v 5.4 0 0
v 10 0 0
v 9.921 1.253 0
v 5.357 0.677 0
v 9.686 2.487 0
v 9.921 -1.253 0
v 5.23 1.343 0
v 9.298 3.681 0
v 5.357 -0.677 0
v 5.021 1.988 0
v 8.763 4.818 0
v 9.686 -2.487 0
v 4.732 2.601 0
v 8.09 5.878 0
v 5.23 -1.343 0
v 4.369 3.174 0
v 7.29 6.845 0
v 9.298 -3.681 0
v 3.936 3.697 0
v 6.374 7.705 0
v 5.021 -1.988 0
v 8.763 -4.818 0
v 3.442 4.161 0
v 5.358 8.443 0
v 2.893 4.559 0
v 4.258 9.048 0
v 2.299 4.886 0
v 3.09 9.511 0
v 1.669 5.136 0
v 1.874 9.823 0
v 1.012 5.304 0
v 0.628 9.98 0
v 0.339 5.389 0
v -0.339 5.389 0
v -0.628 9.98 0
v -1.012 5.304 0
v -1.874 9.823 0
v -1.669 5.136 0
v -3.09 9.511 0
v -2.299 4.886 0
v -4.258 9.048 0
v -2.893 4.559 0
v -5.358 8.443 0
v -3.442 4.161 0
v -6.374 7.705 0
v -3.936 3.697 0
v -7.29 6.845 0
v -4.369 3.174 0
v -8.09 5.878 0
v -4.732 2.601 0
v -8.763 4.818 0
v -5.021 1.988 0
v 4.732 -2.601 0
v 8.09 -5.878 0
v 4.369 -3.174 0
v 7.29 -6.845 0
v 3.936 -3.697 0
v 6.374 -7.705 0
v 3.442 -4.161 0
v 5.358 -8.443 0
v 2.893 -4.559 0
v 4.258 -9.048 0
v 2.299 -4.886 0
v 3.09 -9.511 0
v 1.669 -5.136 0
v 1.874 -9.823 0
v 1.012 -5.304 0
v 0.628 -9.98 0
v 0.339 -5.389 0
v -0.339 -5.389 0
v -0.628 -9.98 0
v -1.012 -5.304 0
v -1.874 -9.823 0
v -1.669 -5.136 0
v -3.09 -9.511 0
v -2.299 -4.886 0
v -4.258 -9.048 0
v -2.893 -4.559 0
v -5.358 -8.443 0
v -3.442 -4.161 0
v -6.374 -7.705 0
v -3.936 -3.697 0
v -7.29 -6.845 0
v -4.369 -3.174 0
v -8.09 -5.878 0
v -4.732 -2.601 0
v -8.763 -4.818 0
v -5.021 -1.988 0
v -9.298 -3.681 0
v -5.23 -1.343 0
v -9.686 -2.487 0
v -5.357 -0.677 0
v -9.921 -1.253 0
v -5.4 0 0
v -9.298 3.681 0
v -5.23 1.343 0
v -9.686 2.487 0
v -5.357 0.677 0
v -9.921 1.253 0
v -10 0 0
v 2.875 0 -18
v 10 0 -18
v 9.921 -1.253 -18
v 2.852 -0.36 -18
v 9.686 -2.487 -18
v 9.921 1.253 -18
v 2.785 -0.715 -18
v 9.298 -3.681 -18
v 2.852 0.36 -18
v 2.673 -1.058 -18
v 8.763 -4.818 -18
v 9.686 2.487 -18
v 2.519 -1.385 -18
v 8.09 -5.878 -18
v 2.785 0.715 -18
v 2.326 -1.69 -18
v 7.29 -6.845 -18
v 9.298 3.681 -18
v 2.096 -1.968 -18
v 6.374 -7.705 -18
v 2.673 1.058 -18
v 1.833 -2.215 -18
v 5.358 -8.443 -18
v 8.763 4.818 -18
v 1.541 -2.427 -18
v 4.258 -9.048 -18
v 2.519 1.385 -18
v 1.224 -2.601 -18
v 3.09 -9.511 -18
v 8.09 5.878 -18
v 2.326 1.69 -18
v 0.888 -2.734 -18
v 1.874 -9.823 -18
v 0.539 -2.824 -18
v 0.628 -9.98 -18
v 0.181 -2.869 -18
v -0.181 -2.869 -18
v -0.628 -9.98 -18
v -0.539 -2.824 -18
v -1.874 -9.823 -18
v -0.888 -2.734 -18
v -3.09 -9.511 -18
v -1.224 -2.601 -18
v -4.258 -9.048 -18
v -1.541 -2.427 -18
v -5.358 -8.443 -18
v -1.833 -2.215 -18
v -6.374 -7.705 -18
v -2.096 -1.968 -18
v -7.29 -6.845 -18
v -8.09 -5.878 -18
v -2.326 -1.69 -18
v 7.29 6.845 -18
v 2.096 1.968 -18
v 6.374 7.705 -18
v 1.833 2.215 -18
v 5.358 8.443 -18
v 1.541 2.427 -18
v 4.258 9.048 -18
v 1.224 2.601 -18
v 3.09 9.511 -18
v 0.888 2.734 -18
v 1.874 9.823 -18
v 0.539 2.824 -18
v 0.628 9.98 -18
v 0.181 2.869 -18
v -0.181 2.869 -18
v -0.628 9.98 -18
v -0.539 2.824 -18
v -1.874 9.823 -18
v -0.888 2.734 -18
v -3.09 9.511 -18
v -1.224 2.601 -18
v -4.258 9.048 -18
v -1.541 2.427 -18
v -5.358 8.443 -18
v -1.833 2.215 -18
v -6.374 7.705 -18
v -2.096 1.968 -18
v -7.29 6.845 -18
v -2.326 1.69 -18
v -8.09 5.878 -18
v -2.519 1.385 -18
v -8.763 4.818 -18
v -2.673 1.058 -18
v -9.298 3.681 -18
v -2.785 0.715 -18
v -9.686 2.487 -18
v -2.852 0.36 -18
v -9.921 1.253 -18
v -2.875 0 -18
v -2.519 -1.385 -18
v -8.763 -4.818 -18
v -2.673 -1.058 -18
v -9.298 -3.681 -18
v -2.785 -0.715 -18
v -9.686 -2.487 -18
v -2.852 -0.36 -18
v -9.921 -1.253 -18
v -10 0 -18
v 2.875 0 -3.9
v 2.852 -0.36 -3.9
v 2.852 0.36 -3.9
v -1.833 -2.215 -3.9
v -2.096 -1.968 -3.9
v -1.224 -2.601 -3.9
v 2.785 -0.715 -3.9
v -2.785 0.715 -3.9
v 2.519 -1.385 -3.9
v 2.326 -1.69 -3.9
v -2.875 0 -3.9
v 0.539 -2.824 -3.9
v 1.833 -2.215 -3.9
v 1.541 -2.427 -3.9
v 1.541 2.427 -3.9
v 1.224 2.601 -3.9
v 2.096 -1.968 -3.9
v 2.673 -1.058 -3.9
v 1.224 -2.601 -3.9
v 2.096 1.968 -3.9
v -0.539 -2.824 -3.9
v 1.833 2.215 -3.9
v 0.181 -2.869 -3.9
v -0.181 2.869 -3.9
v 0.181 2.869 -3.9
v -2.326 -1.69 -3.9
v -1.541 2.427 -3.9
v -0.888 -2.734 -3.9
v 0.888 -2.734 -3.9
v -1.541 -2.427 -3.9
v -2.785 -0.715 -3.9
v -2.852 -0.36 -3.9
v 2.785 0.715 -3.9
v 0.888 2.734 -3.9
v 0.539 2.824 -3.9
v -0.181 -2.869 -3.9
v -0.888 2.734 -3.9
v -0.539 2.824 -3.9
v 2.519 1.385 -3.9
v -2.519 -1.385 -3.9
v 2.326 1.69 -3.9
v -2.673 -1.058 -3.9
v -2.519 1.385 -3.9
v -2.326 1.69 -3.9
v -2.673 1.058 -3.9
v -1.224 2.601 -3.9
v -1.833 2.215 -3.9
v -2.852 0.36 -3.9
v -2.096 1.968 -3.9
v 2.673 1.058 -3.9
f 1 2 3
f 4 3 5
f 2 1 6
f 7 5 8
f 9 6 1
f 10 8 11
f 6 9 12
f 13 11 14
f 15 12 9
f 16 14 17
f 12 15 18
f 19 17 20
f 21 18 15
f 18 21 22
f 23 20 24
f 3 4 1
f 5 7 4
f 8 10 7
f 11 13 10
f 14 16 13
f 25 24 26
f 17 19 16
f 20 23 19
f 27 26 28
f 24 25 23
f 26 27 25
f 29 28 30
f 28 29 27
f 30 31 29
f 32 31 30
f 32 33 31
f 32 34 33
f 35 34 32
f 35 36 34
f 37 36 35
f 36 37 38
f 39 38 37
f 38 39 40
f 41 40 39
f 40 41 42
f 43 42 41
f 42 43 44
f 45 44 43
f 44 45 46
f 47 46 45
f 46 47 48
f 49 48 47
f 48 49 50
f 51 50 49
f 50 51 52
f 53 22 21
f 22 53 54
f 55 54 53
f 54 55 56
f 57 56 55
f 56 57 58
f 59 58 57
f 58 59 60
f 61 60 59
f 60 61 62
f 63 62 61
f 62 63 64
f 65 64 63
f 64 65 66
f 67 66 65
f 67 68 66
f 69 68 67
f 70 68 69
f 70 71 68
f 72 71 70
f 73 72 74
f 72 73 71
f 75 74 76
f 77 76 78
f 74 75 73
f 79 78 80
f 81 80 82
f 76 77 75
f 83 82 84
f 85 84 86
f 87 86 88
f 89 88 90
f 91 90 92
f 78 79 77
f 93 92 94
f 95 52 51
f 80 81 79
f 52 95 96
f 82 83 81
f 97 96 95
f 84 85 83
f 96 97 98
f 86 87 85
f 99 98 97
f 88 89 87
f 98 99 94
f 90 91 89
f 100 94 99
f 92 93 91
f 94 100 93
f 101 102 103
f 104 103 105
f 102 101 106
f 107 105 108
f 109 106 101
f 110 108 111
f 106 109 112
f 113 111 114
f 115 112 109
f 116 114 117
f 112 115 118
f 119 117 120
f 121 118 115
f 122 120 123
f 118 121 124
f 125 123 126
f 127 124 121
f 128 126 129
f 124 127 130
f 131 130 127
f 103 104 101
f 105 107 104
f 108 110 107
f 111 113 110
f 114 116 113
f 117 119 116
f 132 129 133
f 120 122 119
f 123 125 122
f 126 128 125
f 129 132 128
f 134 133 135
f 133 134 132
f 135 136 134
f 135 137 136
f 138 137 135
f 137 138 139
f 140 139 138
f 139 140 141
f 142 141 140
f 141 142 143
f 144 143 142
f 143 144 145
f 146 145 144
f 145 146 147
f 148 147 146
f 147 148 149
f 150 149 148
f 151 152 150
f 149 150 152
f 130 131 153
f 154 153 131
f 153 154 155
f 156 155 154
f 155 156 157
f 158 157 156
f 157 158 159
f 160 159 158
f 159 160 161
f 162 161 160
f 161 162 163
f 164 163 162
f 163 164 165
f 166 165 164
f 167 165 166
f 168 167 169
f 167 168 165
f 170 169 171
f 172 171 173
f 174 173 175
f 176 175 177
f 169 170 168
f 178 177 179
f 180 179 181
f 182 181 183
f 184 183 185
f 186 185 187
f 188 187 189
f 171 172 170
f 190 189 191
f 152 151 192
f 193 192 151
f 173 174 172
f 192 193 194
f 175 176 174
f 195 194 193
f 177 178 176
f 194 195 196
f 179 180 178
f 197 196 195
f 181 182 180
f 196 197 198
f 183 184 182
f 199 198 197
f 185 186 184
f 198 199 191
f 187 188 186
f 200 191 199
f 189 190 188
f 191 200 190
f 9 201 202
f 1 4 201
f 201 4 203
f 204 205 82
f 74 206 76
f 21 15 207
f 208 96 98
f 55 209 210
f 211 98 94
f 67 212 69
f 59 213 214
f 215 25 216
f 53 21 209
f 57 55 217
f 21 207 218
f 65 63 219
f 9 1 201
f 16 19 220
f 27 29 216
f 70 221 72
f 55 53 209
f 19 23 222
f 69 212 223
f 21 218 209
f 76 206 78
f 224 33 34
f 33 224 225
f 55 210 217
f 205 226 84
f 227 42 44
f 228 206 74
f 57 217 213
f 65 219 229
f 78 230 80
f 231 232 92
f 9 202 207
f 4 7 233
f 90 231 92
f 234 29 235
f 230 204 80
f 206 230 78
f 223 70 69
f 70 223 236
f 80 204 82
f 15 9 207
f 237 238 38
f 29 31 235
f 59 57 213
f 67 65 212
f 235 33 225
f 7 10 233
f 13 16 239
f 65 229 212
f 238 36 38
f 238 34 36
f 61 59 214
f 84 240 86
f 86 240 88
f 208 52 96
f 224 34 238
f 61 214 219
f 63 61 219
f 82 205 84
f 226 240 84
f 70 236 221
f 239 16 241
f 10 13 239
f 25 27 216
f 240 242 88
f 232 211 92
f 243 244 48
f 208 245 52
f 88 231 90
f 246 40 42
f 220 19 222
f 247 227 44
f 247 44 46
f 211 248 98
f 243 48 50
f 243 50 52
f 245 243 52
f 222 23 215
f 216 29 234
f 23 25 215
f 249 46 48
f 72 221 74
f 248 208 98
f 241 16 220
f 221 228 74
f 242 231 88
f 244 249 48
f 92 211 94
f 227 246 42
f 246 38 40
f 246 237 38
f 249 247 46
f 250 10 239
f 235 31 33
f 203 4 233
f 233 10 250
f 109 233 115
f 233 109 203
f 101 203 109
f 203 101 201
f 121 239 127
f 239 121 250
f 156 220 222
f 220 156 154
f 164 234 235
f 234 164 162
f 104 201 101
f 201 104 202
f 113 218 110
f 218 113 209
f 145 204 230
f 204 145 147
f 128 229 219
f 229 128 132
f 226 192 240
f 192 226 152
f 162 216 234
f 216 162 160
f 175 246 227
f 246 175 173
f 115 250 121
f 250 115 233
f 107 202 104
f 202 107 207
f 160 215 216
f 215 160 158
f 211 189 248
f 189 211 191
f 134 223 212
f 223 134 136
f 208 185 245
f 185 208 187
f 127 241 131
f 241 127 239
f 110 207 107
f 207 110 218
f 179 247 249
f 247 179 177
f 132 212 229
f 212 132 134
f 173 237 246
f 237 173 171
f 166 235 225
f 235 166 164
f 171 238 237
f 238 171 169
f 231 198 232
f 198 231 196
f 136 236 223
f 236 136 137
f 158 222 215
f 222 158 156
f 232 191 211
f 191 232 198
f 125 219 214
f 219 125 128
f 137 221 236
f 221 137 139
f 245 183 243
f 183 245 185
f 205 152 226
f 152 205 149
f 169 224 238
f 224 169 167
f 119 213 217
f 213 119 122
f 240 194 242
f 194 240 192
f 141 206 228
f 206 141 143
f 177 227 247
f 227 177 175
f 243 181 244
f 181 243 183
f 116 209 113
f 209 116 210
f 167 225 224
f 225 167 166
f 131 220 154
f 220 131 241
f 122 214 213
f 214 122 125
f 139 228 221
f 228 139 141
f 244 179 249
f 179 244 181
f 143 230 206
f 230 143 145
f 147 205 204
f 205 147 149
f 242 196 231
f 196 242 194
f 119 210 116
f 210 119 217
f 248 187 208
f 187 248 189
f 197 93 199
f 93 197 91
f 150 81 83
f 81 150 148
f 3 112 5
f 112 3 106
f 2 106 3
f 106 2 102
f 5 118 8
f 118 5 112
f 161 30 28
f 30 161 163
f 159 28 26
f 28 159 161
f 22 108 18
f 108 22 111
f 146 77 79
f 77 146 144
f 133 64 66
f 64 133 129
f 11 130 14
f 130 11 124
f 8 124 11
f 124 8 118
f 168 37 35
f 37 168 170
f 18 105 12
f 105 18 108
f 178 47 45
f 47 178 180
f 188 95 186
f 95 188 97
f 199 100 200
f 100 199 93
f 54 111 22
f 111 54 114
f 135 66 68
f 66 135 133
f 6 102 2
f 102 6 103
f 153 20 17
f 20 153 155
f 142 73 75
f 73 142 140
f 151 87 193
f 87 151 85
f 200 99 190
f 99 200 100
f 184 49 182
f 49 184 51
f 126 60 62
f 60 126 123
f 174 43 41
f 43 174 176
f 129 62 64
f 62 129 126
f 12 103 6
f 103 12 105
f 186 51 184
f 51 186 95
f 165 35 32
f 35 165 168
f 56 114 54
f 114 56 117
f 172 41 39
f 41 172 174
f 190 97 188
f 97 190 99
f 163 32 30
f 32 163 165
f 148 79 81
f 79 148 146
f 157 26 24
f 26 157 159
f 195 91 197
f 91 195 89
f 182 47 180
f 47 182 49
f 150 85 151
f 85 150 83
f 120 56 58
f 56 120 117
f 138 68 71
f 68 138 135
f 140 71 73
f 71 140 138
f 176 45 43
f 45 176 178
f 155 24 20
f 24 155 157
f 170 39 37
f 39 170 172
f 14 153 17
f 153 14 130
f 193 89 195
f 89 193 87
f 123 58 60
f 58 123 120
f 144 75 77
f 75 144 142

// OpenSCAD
$fn = 50;


difference() {
	union() {
		translate(v = [0, 0, -18.0000000000]) {
			cylinder(h = 18, r = 10.0000000000);
		}
		cylinder(h = 0, r = 19.0000000000);
	}
	union() {
		translate(v = [0, 0, 0]) {
			rotate(a = [0, 0, 0]) {
				difference() {
					union() {
						#translate(v = [0, 0, -18.0000000000]) {
							cylinder(h = 18, r = 2.6000000000);
						}
						#translate(v = [0, 0, -3.9000000000]) {
							cylinder(h = 3.9000000000, r = 10.0000000000, r1 = 2.8750000000, r2 = 5.4000000000);
						}
						#translate(v = [0, 0, -18.0000000000]) {
							cylinder(h = 18, r = 2.8750000000);
						}
						#translate(v = [0, 0, -18.0000000000]) {
							cylinder(h = 18, r = 2.6000000000);
						}
					}
					union();
				}
			}
		}
	}
}
